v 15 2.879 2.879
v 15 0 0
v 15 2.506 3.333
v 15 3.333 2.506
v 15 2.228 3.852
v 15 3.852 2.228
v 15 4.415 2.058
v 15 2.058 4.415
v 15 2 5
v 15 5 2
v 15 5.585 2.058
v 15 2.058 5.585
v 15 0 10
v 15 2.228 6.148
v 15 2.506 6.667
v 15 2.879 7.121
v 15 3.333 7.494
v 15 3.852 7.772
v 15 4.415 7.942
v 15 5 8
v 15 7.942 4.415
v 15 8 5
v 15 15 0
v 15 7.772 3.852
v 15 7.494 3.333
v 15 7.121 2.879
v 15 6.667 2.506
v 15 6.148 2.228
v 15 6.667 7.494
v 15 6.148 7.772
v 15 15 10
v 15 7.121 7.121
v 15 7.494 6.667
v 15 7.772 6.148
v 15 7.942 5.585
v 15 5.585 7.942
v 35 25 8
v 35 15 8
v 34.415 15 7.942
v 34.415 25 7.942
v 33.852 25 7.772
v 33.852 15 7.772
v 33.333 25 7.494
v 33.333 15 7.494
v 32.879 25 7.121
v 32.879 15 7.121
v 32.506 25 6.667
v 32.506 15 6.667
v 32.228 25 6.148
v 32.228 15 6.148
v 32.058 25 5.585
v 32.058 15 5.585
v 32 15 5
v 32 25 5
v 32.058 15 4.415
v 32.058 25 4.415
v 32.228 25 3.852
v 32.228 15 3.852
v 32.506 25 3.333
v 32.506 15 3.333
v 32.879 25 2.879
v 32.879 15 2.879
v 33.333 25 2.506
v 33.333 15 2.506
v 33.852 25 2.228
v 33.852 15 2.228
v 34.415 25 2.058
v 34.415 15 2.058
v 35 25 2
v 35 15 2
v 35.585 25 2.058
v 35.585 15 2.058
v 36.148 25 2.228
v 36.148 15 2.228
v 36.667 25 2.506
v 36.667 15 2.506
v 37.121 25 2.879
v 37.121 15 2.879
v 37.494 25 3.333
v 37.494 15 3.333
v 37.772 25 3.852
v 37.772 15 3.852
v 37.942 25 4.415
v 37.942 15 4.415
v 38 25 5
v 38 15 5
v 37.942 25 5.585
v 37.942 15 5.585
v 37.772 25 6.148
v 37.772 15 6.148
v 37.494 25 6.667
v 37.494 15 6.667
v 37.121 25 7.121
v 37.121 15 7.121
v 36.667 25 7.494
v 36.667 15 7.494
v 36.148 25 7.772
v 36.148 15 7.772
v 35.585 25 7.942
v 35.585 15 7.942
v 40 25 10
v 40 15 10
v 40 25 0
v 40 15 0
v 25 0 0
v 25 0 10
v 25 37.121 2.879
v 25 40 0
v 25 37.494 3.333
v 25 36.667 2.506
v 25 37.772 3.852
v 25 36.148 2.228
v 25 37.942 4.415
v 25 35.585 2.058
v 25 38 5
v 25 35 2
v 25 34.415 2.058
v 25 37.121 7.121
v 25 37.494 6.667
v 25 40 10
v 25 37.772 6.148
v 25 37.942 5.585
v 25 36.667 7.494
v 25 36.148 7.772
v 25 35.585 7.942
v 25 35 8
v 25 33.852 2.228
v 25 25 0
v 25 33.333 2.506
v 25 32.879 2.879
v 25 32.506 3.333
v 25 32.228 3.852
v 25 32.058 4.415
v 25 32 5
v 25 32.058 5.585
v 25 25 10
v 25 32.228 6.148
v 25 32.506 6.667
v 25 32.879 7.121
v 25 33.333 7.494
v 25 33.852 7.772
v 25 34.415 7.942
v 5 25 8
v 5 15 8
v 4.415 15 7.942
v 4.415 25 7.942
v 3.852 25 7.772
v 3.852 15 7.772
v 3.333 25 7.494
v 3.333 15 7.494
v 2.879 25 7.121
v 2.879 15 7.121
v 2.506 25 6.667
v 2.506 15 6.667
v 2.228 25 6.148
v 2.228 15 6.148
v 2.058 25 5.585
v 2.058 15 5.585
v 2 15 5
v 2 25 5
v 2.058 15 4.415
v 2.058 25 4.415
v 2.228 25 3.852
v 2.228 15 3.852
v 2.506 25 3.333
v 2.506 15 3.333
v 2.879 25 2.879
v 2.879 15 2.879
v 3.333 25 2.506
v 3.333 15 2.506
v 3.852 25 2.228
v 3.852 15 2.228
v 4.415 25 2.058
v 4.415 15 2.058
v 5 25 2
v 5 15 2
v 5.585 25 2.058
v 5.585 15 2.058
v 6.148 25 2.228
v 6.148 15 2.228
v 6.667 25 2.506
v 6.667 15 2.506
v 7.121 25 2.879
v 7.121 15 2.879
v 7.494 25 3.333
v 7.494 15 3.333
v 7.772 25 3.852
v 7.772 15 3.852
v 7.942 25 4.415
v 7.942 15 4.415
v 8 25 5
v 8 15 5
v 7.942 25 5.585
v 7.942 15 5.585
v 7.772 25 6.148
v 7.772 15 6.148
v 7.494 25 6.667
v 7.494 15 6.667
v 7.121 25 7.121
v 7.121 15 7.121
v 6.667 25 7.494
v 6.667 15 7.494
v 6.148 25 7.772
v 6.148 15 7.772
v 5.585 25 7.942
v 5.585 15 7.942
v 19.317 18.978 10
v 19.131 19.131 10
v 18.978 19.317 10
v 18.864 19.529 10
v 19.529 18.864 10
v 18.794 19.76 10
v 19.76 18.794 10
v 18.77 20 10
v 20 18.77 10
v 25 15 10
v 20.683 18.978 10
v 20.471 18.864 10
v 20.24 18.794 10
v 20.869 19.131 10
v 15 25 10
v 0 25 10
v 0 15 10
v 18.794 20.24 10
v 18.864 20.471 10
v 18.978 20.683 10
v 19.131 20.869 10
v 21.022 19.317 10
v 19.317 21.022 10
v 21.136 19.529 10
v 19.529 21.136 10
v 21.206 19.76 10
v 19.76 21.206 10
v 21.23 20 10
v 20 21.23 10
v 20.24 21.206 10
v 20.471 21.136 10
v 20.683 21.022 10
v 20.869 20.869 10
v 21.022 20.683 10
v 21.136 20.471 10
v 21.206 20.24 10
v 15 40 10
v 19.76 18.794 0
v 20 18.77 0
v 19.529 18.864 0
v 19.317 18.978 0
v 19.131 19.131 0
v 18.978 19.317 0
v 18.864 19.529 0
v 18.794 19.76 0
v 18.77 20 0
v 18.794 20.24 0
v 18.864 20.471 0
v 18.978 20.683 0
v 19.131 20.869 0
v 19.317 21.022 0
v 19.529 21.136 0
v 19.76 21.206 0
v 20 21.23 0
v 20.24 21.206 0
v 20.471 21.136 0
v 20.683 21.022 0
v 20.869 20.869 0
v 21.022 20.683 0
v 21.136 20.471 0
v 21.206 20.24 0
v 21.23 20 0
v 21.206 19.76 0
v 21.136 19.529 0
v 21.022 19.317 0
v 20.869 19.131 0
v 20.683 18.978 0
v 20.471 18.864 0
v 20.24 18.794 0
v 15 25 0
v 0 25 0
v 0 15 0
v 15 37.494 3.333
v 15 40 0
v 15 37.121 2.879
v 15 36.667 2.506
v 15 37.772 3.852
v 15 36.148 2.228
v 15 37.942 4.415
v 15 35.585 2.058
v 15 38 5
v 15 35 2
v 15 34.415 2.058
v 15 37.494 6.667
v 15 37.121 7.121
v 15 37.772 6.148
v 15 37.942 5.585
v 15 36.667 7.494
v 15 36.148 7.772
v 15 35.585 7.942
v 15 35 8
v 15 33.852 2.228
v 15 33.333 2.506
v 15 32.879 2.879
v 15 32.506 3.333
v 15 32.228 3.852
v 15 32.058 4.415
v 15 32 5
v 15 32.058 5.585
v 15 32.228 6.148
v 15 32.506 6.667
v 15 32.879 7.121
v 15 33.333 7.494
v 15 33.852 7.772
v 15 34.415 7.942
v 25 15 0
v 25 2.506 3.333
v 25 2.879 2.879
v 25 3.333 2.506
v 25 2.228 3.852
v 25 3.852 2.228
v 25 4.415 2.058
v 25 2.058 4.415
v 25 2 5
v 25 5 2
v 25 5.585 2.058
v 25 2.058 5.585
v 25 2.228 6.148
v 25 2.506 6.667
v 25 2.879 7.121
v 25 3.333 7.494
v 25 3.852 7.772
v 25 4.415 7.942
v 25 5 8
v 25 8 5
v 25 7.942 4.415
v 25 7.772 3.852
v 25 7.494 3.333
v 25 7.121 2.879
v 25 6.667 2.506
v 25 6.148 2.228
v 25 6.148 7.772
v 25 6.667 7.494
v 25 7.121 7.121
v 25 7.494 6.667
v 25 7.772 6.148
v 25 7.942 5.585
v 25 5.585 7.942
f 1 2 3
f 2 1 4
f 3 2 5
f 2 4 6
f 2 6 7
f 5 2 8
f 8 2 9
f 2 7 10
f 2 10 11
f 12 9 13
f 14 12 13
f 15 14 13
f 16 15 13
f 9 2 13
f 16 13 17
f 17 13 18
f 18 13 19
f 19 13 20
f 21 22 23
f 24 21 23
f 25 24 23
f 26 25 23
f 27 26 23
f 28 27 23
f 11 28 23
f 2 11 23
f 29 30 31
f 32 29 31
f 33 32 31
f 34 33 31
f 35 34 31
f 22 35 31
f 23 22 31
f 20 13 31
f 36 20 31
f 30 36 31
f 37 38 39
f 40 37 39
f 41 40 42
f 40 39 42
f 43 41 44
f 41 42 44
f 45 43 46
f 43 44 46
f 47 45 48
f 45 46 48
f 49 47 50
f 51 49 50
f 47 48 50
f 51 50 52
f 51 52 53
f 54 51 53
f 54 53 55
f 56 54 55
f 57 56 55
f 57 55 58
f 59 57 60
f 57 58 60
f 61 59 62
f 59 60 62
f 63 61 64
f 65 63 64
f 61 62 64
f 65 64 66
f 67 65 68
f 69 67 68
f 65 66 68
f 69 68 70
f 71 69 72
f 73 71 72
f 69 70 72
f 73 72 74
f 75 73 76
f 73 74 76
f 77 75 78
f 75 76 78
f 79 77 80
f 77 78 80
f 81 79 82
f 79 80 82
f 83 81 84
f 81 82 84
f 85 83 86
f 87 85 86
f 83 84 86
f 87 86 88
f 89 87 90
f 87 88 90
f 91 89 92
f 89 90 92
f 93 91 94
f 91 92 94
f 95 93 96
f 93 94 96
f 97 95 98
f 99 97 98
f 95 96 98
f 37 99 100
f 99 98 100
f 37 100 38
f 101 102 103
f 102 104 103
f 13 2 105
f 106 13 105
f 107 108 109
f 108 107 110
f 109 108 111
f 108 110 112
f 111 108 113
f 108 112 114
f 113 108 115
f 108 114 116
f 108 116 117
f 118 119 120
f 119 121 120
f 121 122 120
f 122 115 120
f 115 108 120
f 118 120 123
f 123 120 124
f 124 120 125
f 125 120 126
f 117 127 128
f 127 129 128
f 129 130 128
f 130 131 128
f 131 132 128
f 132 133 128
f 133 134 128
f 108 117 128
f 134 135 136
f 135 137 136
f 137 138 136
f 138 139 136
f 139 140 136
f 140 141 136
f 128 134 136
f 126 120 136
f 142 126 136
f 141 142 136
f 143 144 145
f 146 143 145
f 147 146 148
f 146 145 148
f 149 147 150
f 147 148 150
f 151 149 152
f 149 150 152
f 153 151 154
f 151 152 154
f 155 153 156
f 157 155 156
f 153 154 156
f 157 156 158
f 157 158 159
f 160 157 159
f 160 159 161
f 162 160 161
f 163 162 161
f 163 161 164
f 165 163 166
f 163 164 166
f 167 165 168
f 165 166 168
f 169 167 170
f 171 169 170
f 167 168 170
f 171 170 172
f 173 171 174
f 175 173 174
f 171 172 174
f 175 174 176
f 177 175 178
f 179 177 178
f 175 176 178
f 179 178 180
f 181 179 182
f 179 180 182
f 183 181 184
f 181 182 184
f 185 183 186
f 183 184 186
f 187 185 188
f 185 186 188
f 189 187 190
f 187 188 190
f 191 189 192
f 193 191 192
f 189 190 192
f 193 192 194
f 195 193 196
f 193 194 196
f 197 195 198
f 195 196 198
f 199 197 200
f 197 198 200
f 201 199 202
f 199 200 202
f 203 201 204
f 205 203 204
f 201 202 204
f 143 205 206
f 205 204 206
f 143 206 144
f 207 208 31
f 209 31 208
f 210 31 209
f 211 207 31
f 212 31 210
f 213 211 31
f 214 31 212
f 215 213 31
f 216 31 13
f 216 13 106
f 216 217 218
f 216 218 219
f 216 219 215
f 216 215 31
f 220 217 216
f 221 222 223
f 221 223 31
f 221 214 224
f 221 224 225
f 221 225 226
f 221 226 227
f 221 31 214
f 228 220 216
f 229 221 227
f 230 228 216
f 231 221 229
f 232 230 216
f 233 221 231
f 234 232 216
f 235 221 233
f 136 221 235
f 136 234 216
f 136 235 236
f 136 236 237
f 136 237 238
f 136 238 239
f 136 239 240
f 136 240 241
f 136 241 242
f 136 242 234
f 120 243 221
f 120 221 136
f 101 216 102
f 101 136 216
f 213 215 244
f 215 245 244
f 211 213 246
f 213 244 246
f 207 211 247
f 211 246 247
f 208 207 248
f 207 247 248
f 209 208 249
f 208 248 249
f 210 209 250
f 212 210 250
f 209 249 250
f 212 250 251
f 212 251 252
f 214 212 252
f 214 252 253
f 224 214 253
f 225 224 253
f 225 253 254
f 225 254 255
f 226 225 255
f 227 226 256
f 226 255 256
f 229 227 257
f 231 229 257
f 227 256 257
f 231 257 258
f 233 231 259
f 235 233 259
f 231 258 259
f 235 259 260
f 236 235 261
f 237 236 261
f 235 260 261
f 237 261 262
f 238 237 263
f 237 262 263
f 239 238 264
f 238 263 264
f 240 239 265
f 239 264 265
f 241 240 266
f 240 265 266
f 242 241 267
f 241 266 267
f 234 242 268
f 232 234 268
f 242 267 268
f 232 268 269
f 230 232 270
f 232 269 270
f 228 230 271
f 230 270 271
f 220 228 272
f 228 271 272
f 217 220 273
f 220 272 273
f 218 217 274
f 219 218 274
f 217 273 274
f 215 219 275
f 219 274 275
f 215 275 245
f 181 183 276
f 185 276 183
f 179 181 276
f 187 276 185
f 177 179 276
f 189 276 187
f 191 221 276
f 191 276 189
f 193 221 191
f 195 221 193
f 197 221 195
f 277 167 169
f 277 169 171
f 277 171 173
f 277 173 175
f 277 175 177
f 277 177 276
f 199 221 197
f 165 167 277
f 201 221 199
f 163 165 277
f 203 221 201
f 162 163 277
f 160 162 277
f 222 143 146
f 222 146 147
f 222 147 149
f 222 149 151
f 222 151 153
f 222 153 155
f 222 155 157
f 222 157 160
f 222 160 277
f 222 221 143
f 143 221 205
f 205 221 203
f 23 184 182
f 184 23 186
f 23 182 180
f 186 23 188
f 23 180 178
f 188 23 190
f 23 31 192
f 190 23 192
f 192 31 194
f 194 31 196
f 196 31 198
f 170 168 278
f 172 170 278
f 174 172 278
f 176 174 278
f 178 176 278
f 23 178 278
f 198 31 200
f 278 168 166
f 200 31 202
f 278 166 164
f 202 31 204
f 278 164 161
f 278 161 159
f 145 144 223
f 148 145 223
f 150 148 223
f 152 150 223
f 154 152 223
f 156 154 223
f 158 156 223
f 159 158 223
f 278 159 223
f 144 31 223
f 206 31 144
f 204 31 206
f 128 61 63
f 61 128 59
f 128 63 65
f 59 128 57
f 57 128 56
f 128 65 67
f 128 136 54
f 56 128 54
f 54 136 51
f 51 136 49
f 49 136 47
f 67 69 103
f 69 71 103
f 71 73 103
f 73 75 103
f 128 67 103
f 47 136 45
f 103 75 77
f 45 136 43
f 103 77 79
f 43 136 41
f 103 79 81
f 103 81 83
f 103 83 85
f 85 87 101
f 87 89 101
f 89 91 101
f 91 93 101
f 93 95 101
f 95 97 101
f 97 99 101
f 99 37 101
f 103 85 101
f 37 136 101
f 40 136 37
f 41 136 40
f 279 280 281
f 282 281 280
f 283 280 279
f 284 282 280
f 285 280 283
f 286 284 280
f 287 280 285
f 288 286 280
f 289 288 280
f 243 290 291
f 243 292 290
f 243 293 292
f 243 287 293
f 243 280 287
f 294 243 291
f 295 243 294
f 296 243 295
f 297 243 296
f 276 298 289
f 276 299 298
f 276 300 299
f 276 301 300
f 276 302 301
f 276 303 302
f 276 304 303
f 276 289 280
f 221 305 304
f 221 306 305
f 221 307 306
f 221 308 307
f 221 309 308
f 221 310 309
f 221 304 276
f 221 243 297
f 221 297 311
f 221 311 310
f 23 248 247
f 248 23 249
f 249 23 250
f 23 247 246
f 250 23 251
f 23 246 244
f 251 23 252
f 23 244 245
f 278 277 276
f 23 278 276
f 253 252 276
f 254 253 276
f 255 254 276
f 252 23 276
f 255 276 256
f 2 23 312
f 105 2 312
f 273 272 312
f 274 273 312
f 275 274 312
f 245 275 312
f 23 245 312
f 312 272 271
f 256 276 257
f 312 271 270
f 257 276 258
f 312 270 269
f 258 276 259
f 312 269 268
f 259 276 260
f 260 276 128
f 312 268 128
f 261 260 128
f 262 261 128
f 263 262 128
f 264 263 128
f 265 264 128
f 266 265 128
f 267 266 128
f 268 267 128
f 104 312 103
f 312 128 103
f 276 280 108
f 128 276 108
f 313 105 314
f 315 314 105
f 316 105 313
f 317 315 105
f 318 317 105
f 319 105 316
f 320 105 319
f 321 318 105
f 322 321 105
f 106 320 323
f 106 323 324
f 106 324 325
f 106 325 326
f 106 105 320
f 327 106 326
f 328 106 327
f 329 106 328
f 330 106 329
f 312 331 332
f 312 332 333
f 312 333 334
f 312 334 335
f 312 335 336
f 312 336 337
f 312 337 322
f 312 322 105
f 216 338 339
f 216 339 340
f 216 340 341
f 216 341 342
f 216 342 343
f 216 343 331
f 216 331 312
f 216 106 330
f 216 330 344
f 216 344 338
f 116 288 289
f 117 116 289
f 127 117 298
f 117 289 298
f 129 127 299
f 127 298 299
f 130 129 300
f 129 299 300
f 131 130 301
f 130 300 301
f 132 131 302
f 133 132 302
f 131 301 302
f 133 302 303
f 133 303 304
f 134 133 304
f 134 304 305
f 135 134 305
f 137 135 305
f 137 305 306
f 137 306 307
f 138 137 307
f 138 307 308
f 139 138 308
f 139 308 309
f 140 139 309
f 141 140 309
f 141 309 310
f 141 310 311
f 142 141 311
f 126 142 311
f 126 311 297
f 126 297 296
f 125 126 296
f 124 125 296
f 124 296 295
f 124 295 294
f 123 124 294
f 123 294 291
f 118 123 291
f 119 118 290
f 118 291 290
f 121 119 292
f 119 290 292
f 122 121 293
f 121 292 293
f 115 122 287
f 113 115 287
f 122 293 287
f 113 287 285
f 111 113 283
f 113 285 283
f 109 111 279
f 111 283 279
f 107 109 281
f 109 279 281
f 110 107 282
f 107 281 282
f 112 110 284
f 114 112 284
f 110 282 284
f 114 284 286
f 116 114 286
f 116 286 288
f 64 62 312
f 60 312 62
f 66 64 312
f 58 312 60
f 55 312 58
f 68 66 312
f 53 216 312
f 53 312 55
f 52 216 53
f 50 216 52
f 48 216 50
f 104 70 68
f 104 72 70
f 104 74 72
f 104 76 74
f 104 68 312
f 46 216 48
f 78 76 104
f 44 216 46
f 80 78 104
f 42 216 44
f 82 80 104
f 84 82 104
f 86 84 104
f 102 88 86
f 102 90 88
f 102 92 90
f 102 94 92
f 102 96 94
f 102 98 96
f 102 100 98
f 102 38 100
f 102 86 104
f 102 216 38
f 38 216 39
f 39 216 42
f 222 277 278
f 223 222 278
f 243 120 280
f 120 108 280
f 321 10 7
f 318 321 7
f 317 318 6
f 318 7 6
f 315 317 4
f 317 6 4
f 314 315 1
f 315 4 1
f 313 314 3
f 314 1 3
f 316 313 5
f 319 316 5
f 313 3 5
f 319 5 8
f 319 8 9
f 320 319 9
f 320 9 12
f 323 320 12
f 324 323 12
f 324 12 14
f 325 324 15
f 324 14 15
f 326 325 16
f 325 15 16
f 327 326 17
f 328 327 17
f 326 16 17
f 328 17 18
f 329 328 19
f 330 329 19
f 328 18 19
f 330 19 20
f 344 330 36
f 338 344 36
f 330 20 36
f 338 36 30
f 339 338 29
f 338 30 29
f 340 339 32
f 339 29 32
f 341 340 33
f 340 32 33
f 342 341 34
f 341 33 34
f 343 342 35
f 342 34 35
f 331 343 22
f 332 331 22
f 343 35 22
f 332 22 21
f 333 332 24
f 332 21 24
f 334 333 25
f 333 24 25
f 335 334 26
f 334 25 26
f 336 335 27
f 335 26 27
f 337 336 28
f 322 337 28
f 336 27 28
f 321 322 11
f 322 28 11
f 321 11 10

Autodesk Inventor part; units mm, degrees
ref_plane "YZ Plane" through (0, 0, 0) normal (1, 0, 0) x (0, 1, 0)
ref_plane "XZ Plane" through (0, 0, 0) normal (0, 1, 0) x (-1, 0, 0)
ref_plane "XY Plane" through (0, 0, 0) normal (0, 0, 1) x (1, 0, 0)
sketch "スケッチ1" plane through (0, 0, 0) normal (0, 0, 1) x (1, 0, 0)
  line L0 (0, 0) -> (40, 0)
  line L1 (40, 0) -> (40, 40)
  line L2 (40, 40) -> (0, 40)
  line L3 (0, 40) -> (0, 0)
  dimension "d0" = 40
  dimension "d1" = 40
extrude "押し出し1" add sketch "スケッチ1" along normal blind 10
sketch "スケッチ2" plane through (0, 0, 10) normal (0, 0, 1) x (1, 0, 0)
  line L0 (40, 40) -> (0, 40) projected
  line L1 (40, 40) -> (25, 40)
  line L2 (25, 40) -> (25, 25)
  line L3 (25, 25) -> (40, 25)
  line L4 (40, 25) -> (40, 40)
  point P0 (0, 0)
  point P1 (25, 40)
  dimension "d4" = 15
  dimension "d5" = 15
extrude "押し出し2" cut sketch "スケッチ2" against normal blind 10
sketch "スケッチ3" plane through (0, 0, 10) normal (0, 0, 1) x (1, 0, 0)
  line L0 (0, 40) -> (15, 40)
  line L1 (15, 40) -> (15, 25)
  line L2 (15, 25) -> (0, 25)
  line L3 (0, 25) -> (0, 40)
  line L4 (0, 0) -> (40, 0) projected
  line L5 (0, 0) -> (15, 0)
  line L6 (15, 0) -> (15, 15)
  line L7 (15, 15) -> (0, 15)
  line L8 (0, 15) -> (0, 0)
  line L9 (40, 0) -> (25, 0)
  line L10 (25, 0) -> (25, 15)
  line L11 (25, 15) -> (40, 15)
  line L12 (40, 15) -> (40, 0)
  point P0 (25, 0)
  dimension "d8" = 15
  dimension "d9" = 15
  dimension "d10" = 15
  dimension "d11" = 15
  dimension "d12" = 15
  dimension "d13" = 15
extrude "押し出し3" cut sketch "スケッチ3" against normal blind 10
sketch "スケッチ4" plane through (25, 25, 10) normal (1, 0, 0) x (0, 0, -1)
  line L0 (0, 15) -> (10, 15) projected
  line L1 (10, 15) -> (10, 0) projected
  line L2 (10, -10) -> (10, -25) projected
  line L3 (10, -25) -> (0, -25) projected
  point P0 (5, 10)
  point P1 (5, -20)
  dimension "d16" = 5
  dimension "d17" = 5
  dimension "d18" = 5
  dimension "d19" = 5
hole "穴1" at (25, 35, 5) at (25, 5, 5) direction (-1, 0, 0) diameter 6 end through all
sketch "スケッチ5" plane through (0, 25, 10) normal (0, 1, 0) x (1, 0, 0)
  line L0 (0, 10) -> (15, 10) projected
  line L1 (0, 0) -> (0, 10) projected
  line L2 (25, 10) -> (40, 10) projected
  line L3 (40, 10) -> (40, 0) projected
  point P0 (5, 5)
  point P1 (35, 5)
  dimension "d27" = 5
  dimension "d28" = 5
  dimension "d29" = 5
  dimension "d30" = 5
hole "穴2" at (5, 25, 5) at (35, 25, 5) direction (0, -1, 0) diameter 6 end through all
sketch "スケッチ6" plane through (0, 0, 10) normal (0, 0, 1) x (1, 0, 0)
  line L0 (40, 15) -> (40, 25) projected
  line L1 (25, 40) -> (15, 40) projected
  point P0 (0, 0)
  point P1 (20, 20)
  dimension "d38" = 20
  dimension "d39" = 20
hole "穴3" at (20, 20, 10) direction (0, 0, -1) diameter 2.459 end through all thread size "M3x0.5" class "6H" standard "ISO Metric profile"
properties part number "シリンダ先端パーツ"
